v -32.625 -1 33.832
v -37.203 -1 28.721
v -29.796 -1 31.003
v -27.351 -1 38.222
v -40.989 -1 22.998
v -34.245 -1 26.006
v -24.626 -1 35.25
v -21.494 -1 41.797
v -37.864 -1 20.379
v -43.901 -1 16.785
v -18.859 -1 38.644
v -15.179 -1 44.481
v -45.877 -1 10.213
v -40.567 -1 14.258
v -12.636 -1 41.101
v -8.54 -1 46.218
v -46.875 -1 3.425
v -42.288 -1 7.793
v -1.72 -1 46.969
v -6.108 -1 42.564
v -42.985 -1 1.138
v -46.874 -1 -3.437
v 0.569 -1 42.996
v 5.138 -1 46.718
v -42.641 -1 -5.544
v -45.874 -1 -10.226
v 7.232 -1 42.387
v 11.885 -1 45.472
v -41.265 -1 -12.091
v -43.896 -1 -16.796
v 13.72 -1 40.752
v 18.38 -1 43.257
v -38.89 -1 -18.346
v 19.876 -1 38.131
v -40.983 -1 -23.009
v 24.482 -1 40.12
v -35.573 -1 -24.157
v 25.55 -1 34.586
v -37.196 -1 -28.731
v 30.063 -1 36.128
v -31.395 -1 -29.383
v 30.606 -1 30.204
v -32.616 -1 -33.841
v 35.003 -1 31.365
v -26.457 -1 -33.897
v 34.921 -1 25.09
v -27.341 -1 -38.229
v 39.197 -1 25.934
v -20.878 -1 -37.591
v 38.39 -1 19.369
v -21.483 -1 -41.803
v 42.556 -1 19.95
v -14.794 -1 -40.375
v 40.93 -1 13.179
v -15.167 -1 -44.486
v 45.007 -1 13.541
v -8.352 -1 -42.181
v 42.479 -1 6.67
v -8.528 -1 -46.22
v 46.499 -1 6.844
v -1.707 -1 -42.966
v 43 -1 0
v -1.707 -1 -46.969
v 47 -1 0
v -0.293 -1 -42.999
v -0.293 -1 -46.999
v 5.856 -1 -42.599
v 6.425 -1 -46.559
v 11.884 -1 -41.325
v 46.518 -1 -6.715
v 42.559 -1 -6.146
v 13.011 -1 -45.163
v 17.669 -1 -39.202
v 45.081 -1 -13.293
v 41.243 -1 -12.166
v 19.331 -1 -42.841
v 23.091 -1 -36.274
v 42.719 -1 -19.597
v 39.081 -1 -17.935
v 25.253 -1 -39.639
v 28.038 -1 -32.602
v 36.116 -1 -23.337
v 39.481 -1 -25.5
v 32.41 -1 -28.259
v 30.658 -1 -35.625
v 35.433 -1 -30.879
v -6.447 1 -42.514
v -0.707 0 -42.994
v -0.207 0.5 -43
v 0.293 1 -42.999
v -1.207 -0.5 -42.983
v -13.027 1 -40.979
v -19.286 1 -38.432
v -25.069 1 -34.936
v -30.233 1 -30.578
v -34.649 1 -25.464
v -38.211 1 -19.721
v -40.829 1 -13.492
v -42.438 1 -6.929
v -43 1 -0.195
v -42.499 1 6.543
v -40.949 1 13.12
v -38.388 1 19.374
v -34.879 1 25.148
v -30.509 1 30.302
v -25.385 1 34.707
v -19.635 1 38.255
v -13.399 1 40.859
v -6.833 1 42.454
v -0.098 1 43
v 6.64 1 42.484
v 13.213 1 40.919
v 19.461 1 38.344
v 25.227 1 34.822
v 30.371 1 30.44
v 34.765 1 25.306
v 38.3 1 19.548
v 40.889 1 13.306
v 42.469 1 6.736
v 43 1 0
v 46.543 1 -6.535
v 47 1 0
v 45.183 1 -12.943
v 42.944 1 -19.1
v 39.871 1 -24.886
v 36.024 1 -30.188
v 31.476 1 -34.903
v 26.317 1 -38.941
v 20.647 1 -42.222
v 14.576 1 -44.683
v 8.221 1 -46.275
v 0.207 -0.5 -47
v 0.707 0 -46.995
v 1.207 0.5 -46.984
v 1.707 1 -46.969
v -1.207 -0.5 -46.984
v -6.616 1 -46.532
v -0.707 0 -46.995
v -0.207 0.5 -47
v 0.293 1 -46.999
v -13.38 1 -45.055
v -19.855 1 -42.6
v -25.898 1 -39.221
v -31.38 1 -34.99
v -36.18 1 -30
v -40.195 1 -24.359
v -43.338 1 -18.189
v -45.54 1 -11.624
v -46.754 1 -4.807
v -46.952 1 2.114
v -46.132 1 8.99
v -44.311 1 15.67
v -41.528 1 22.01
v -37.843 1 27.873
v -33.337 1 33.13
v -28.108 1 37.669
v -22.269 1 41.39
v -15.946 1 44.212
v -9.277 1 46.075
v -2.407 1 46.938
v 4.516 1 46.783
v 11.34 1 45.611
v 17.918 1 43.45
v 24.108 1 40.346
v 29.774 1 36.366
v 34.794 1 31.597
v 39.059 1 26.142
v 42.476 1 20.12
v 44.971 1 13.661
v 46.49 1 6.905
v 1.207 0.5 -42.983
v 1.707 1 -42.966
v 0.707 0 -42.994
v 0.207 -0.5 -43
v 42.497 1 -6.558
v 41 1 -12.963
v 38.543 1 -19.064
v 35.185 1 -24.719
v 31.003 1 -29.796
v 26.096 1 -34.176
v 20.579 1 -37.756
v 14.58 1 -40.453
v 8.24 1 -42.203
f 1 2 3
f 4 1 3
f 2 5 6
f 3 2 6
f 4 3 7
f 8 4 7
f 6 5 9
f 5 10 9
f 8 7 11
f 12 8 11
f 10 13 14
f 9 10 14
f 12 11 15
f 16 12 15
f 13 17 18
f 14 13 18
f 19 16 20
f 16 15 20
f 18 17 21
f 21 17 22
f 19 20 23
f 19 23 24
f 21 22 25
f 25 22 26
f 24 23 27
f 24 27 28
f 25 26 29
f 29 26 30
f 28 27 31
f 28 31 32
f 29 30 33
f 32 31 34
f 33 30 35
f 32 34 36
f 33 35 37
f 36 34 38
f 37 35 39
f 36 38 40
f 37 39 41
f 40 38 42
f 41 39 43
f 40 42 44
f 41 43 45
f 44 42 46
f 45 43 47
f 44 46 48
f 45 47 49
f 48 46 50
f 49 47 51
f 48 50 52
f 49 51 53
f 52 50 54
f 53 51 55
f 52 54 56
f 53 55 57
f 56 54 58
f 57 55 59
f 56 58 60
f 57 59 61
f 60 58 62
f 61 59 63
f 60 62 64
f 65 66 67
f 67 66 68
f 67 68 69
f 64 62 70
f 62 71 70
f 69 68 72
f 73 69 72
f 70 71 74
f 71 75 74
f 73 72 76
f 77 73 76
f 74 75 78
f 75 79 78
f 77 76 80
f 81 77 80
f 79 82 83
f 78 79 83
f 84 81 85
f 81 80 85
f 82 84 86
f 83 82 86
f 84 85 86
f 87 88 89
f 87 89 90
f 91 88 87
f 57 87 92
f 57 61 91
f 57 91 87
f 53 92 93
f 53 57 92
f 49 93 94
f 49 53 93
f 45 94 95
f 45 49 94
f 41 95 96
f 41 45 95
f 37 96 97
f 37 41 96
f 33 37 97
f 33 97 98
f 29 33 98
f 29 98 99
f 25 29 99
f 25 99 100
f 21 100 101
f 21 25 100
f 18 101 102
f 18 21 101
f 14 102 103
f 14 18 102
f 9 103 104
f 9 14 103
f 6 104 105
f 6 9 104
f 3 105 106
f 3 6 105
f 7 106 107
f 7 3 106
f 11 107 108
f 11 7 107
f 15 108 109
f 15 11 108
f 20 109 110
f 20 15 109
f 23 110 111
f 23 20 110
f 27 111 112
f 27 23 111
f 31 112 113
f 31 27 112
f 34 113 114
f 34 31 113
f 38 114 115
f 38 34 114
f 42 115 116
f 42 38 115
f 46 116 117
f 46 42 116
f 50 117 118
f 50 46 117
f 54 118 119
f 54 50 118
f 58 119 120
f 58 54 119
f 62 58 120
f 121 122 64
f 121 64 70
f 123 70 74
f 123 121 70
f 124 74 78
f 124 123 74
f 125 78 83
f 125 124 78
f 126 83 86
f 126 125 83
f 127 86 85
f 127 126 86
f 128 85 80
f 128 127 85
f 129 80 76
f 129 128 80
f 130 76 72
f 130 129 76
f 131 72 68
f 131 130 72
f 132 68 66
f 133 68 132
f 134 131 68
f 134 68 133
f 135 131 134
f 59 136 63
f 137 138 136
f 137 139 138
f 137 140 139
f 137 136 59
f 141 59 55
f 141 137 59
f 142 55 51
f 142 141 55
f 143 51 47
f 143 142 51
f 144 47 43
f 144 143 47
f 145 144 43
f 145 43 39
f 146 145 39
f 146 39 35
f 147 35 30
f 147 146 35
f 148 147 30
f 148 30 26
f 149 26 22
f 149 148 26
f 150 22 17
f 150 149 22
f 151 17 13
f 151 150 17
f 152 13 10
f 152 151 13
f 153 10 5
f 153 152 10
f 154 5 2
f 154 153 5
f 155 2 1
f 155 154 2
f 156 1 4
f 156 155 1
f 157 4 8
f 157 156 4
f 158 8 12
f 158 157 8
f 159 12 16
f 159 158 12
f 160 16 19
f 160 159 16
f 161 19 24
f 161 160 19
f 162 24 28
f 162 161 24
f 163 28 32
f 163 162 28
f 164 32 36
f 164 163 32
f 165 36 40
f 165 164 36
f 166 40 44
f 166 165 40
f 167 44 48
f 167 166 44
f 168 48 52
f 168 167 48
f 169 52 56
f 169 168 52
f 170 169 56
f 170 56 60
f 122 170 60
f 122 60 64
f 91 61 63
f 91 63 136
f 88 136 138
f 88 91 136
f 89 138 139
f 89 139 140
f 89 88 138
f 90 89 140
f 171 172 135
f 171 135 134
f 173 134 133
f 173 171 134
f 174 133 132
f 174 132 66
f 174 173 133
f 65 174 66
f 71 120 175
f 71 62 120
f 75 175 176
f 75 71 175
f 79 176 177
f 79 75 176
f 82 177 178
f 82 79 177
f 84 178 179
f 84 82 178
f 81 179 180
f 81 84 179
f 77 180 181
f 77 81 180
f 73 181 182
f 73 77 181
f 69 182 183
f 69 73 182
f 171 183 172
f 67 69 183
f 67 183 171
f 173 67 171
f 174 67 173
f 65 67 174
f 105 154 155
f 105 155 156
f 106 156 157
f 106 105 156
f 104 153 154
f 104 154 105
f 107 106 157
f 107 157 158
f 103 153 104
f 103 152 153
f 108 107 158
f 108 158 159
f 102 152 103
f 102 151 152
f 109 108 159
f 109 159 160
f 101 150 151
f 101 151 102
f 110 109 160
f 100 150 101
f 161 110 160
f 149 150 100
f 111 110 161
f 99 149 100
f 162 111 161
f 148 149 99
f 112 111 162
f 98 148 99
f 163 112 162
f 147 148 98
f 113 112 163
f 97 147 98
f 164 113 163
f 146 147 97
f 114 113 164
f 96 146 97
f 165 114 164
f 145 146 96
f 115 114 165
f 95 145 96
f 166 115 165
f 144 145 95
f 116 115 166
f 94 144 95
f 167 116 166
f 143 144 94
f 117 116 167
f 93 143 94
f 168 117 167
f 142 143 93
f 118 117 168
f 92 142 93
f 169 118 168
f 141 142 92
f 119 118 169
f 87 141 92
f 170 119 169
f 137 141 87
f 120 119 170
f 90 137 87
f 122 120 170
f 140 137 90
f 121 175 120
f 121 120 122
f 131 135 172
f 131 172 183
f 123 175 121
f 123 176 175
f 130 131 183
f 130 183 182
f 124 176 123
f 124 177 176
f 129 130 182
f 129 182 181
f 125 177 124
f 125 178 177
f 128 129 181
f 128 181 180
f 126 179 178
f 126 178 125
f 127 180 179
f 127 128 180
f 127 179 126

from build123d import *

# Parameters (mm, degrees)
SKETCH1_R           = 47
SKETCH1_R_2         = 43
BOSS_EXTRUDE1_DEPTH = 1
CUT_EXTRUDE1_DEPTH  = 48


with BuildPart() as part:
    # Sketch1 → Boss-Extrude1 (new body, symmetric)
    with BuildSketch(Plane(origin=(0, 0, 0), x_dir=(1, 0, 0), z_dir=(0, 1, 0))):
        Circle(SKETCH1_R)
        Circle(SKETCH1_R_2, mode=Mode.SUBTRACT)
    extrude(amount=BOSS_EXTRUDE1_DEPTH, both=True)

    # Sketch2 → Cut-Extrude1 (cut, through all)
    with BuildSketch(Plane.XY):
        Polygon((-7.424621202, -6.717514421), (6.717514421, 7.424621202), (7.424621202, 6.717514421), (-6.717514421, -7.424621202), align=None)
    extrude(amount=-CUT_EXTRUDE1_DEPTH, mode=Mode.SUBTRACT)


solid = part.part
